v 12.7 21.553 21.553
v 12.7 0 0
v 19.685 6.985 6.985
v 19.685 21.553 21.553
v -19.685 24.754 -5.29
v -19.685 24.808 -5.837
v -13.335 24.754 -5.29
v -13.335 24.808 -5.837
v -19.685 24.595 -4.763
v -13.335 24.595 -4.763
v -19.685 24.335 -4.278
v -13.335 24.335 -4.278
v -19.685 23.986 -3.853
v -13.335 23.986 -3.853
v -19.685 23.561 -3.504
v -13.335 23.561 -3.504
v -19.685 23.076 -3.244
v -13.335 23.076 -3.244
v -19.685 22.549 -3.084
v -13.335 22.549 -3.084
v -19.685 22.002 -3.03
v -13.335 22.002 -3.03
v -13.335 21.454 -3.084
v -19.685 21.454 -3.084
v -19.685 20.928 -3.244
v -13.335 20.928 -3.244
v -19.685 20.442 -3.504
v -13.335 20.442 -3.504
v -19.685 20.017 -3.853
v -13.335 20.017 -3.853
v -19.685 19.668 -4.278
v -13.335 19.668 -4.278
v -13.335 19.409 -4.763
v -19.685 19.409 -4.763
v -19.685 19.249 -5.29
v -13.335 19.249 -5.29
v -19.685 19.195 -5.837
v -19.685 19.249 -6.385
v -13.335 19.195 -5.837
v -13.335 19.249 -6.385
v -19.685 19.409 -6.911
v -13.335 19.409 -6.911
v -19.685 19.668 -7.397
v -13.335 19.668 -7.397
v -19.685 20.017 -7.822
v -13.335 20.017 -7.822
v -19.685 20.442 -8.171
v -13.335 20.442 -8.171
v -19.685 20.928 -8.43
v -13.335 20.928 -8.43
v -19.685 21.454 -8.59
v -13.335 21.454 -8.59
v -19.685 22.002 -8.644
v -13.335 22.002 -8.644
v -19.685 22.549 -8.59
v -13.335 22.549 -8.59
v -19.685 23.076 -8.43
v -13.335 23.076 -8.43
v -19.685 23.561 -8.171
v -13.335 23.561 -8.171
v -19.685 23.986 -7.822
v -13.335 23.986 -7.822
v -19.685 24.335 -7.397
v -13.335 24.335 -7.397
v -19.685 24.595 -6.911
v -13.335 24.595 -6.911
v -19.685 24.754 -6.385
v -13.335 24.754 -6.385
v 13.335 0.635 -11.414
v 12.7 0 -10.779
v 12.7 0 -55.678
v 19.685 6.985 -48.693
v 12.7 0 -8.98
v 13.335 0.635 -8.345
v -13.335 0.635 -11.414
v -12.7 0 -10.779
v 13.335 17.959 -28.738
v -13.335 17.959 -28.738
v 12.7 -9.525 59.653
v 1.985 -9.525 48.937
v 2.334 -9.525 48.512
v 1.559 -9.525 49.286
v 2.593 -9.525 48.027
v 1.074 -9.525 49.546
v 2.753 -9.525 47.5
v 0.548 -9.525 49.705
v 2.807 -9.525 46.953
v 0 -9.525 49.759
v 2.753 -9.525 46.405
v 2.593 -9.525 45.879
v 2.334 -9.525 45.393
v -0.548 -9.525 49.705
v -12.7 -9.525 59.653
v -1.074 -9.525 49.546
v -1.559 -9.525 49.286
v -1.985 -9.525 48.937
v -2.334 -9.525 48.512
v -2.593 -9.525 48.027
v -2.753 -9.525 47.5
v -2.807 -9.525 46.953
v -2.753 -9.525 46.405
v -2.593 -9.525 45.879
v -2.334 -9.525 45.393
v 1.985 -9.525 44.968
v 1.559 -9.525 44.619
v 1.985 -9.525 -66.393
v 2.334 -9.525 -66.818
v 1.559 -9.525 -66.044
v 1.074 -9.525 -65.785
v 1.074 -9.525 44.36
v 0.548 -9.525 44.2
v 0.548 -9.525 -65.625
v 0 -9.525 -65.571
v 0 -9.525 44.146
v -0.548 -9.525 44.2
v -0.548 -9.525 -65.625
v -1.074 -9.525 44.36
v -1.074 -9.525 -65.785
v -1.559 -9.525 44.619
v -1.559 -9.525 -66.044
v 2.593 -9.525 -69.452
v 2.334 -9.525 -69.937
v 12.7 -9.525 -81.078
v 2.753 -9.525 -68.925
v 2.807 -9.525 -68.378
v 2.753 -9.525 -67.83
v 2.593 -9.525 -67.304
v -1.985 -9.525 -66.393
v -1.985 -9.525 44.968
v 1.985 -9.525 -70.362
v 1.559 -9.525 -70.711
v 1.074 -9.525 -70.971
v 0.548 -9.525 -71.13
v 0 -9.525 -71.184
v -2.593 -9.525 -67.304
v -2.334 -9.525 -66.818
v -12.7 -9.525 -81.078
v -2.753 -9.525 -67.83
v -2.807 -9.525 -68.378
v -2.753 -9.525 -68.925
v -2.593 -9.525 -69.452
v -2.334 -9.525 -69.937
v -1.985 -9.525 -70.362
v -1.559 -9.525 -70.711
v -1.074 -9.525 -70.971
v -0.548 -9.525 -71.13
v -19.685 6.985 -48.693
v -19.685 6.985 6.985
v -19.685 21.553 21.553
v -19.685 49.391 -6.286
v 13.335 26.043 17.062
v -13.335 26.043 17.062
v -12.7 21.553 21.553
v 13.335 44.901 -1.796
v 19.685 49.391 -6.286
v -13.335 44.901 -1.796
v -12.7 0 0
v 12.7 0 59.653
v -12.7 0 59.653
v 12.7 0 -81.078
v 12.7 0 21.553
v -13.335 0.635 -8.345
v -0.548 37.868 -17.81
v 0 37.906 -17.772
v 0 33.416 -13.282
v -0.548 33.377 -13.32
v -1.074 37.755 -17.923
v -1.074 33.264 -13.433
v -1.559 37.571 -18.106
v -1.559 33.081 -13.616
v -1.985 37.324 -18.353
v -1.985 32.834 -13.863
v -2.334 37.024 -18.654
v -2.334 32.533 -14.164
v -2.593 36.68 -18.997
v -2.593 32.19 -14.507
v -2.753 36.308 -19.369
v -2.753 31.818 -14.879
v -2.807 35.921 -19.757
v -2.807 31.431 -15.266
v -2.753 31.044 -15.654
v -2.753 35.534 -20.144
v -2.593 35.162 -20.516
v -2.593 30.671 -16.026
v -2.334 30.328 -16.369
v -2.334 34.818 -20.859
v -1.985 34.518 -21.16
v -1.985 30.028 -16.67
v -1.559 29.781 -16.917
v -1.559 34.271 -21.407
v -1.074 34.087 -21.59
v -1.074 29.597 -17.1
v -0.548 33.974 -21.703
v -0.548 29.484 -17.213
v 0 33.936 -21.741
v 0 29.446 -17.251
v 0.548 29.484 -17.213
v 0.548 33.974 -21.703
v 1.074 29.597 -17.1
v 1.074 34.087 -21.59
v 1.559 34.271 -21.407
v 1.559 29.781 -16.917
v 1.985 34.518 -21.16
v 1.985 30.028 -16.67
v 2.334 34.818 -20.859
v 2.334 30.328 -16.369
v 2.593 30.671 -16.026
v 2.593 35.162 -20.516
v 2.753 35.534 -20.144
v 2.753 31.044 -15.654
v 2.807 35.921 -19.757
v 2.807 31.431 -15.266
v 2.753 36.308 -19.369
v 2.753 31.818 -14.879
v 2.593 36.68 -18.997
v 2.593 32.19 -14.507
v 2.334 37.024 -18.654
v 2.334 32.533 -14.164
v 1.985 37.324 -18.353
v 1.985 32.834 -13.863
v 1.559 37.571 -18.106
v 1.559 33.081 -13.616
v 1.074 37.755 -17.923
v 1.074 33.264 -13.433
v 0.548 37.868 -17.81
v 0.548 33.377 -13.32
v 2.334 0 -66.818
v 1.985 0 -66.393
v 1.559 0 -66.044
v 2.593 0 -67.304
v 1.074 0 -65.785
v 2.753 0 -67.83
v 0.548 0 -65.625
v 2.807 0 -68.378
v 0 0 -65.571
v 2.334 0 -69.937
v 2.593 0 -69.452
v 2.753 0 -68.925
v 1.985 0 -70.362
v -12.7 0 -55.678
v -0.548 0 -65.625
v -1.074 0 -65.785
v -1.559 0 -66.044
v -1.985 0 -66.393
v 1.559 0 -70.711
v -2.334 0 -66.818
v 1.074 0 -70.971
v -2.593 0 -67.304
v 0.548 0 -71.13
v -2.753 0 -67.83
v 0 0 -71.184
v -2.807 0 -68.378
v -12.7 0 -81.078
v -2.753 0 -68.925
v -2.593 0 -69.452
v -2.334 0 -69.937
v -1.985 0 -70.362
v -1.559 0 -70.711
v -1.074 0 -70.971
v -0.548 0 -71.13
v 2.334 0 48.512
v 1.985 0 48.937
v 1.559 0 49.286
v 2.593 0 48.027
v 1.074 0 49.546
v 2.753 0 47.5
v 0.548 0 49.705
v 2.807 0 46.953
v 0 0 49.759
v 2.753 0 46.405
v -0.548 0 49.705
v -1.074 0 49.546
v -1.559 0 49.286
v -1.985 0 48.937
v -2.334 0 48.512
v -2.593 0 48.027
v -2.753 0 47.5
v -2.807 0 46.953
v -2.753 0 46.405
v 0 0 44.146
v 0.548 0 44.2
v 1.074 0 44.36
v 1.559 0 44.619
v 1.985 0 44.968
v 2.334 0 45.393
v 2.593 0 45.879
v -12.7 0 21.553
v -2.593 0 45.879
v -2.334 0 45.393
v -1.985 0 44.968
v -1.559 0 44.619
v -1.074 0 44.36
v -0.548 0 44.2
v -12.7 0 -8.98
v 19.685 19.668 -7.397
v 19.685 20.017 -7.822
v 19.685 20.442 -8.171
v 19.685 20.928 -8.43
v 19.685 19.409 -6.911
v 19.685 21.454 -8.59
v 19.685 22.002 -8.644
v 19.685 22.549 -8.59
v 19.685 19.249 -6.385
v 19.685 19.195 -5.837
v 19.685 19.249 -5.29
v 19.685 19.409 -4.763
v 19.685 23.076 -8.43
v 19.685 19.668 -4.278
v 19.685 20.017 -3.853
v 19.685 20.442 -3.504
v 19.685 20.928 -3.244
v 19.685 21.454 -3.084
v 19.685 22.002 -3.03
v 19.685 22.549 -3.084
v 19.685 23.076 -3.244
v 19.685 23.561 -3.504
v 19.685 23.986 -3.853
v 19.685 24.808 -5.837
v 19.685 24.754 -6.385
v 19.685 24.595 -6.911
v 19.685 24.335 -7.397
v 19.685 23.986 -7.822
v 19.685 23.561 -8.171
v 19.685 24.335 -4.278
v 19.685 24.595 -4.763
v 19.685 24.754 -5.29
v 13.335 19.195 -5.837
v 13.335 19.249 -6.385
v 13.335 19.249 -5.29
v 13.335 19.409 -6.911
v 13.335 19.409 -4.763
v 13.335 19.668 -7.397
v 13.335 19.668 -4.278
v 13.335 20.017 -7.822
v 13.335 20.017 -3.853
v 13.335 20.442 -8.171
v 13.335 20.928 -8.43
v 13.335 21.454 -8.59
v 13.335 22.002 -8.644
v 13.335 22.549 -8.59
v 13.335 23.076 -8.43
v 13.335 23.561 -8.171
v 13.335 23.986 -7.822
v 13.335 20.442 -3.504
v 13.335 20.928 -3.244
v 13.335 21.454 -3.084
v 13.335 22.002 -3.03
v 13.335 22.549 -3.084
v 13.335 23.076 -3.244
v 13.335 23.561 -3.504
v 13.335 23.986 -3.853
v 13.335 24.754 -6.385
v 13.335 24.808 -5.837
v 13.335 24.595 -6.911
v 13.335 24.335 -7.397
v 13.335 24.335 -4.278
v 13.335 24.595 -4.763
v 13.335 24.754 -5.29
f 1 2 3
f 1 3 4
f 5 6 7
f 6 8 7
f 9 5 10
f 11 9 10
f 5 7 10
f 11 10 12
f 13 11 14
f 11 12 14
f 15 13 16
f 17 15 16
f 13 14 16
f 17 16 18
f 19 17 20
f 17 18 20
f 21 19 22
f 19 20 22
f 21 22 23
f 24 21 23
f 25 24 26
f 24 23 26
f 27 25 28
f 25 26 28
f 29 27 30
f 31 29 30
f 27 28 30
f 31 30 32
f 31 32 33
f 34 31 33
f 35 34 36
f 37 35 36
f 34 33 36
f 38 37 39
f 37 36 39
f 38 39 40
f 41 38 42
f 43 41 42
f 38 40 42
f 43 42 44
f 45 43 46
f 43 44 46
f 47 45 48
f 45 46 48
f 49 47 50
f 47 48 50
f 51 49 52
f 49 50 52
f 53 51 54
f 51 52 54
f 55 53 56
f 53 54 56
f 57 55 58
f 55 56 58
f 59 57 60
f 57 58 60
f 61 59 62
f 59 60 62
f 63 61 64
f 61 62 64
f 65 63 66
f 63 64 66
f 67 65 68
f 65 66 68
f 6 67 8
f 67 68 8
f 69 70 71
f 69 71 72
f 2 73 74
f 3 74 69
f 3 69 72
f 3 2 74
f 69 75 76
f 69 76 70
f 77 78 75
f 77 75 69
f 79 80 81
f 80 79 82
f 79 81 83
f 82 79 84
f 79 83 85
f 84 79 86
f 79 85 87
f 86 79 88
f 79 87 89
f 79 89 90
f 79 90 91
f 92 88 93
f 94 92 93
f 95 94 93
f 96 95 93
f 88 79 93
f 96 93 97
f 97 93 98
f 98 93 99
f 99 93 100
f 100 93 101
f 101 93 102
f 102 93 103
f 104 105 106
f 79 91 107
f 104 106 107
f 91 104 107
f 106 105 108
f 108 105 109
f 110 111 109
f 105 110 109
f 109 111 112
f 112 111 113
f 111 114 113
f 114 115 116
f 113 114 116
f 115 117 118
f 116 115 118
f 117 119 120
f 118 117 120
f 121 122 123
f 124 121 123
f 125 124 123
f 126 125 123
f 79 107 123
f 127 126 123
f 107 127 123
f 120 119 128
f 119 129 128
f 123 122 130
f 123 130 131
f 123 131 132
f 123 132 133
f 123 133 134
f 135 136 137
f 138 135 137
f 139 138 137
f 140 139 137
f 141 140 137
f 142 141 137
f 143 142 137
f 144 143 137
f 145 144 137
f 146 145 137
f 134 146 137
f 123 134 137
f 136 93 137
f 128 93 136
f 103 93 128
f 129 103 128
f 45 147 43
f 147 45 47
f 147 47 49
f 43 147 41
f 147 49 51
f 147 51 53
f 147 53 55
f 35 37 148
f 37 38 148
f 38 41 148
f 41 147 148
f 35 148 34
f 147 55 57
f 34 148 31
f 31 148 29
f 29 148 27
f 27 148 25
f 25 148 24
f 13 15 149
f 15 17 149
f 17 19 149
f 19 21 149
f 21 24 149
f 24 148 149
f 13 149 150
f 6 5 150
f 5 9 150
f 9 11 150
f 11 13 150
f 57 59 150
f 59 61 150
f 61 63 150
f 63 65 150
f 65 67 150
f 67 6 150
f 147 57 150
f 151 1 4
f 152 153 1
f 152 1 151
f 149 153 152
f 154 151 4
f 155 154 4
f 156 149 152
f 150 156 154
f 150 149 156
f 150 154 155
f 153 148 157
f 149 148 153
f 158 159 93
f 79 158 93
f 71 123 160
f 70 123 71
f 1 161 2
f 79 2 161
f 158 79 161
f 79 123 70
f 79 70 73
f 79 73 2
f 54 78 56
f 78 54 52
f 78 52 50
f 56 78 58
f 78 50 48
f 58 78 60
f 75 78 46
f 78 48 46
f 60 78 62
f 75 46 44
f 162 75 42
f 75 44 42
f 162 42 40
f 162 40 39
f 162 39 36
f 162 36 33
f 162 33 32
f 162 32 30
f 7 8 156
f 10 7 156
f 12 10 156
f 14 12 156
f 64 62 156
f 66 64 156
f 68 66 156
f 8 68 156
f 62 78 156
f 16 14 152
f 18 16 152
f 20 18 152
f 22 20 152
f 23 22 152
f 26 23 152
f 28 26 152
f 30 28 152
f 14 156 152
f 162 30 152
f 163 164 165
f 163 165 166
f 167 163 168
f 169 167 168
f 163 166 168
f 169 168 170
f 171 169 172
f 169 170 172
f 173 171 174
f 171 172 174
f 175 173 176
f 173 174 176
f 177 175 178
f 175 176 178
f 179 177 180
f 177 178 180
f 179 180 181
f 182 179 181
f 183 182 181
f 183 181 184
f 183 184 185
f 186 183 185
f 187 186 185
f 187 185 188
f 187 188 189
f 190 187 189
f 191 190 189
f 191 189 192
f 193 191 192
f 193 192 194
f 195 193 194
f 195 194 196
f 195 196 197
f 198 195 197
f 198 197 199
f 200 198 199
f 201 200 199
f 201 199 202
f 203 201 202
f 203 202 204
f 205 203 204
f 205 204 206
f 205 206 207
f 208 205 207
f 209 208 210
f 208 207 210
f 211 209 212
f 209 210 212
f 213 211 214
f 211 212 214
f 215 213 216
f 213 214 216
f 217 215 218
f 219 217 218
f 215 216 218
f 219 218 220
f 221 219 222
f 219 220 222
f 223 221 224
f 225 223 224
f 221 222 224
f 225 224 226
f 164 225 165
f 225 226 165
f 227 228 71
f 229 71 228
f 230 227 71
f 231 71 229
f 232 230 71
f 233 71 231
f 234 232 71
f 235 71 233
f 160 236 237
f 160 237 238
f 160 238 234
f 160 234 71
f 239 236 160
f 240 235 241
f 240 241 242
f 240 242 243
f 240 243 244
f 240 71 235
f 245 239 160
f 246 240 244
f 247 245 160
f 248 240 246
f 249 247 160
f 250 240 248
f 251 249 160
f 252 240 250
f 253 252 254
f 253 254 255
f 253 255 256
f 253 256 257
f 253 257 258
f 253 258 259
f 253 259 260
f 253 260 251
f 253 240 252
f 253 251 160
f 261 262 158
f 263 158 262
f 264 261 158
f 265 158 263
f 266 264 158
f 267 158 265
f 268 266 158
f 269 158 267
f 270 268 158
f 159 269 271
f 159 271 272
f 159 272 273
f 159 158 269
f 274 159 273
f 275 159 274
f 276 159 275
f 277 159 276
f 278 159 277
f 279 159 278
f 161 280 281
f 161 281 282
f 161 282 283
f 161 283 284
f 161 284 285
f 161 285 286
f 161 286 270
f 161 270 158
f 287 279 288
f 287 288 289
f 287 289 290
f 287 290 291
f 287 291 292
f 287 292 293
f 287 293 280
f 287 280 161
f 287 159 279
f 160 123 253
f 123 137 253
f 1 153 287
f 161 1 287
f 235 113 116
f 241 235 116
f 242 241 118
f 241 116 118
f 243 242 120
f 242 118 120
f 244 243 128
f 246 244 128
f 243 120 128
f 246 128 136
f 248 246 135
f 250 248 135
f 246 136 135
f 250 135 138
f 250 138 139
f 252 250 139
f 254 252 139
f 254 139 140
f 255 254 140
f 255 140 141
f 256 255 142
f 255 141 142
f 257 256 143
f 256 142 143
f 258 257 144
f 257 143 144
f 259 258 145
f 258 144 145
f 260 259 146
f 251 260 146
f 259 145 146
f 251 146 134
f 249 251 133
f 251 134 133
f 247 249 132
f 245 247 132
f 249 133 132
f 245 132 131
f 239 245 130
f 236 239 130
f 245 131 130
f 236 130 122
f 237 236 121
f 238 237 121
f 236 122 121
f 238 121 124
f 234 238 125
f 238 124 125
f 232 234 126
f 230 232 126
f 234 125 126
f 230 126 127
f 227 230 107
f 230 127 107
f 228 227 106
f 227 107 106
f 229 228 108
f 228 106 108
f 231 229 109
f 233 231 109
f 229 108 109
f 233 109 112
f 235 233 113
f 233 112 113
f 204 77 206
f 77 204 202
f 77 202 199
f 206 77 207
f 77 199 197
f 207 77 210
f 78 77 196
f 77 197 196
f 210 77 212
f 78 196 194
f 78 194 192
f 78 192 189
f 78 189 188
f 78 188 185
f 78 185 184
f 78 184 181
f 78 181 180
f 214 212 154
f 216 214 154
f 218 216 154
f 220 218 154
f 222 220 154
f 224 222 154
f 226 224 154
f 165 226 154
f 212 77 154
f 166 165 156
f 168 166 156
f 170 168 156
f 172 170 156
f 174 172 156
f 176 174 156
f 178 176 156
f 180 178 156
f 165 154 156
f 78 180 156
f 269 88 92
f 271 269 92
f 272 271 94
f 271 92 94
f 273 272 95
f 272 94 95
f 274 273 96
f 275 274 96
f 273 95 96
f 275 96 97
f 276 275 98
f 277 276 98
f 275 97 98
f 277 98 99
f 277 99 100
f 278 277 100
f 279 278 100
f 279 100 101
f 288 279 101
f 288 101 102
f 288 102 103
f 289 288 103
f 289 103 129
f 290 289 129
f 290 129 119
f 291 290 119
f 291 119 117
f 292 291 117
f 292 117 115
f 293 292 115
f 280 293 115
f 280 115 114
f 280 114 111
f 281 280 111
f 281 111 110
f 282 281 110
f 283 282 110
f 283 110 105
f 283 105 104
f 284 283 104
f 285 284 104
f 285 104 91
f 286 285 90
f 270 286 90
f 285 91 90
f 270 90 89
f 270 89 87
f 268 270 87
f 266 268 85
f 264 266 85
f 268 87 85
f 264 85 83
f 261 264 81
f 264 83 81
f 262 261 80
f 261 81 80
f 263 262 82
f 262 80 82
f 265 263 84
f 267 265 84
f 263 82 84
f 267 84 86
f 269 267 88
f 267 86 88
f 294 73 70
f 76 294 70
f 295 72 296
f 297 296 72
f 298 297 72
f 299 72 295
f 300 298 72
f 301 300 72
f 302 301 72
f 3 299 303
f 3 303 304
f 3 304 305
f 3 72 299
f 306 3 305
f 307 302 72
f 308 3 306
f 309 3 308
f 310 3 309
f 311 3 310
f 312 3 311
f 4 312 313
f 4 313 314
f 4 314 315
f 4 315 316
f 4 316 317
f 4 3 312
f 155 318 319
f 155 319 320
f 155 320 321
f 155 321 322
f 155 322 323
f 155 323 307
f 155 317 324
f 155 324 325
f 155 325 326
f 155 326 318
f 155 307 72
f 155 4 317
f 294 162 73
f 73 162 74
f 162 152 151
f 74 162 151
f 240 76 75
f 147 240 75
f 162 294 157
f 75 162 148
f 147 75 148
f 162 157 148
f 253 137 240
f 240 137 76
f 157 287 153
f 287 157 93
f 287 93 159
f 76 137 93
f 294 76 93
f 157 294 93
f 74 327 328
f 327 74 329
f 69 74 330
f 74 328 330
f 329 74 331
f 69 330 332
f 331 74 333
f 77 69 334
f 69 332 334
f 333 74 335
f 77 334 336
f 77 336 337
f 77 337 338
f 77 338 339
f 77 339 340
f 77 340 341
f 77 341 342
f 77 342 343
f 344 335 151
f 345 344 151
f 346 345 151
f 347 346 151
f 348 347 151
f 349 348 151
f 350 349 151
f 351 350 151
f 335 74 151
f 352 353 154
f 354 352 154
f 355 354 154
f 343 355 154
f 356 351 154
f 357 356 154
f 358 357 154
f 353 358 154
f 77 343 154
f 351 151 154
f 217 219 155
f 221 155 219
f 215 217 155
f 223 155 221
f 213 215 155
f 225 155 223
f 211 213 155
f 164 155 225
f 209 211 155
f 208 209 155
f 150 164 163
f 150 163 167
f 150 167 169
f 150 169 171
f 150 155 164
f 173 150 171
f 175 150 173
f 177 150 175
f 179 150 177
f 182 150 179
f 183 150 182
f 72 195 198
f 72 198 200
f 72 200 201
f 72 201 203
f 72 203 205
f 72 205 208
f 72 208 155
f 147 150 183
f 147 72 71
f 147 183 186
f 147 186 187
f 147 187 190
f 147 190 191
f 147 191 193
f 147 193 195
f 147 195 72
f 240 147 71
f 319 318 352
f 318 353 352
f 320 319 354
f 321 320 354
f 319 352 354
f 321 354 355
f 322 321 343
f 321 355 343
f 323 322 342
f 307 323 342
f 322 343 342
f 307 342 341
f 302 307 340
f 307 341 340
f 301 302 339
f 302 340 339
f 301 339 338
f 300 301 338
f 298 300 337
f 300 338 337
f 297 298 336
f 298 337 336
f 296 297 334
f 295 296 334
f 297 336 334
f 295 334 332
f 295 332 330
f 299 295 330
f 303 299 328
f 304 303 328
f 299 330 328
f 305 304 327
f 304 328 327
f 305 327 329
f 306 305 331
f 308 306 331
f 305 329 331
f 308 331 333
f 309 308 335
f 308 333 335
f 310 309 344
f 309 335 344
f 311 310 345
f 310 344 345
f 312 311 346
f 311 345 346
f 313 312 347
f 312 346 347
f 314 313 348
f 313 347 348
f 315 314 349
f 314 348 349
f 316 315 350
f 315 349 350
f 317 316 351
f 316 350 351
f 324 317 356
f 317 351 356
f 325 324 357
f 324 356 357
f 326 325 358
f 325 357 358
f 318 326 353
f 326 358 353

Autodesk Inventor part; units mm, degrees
ref_plane "YZ Plane" through (0, 0, 0) normal (1, 0, 0) x (0, 1, 0)
ref_plane "XZ Plane" through (0, 0, 0) normal (0, 1, 0) x (-1, 0, 0)
ref_plane "XY Plane" through (0, 0, 0) normal (0, 0, 1) x (1, 0, 0)
sketch "Sketch1" plane through (0, 0, 0) normal (1, 0, 0) x (0, 1, 0)
  line L0 (0, 0) -> (21.5526, 21.5526)
  line L1 (21.5526, 21.5526) -> (49.3914, -6.2862)
  line L2 (0, -98.8011) -> (0, 41.6267) projected
  line L3 (49.3914, -6.2862) -> (0, -55.6776)
  line L4 (0, 0) -> (0, -55.6776)
  line L5 (26.9408, 16.1645) -> (0, -10.7763) construction
  dimension "d0" = 39.37
  dimension "d1" = 45
  dimension "d5" = 7.62
  dimension "d6" = 38.1
extrude "Extrusion1" add sketch "Sketch1" along normal mid plane 39.37
sketch "Sketch2" plane through (-19.685, 21.5526, 21.5526) normal (0, 0.7071, 0.7071) x (1, 0, 0)
  line L0 (0, 0) -> (39.37, 0) construction
  line L1 (39.37, 0) -> (39.37, 39.37) construction
  line L2 (0, 0) -> (39.37, 39.37) construction
  line L3 (39.37, 39.37) -> (0, 39.37) construction
  line L4 (0, 39.37) -> (39.37, 0) construction
  line L5 (6.35, 6.35) -> (33.02, 6.35)
  line L6 (33.02, 6.35) -> (33.02, 33.02)
  line L7 (33.02, 33.02) -> (6.35, 33.02)
  line L8 (6.35, 33.02) -> (6.35, 6.35)
  line L9 (6.35, 6.35) -> (33.02, 33.02) construction
  line L10 (33.02, 6.35) -> (6.35, 33.02) construction
  point P0 (19.685, 0)
  point P1 (19.685, 19.685)
  dimension "d7" = 26.67
extrude "Extrusion2" cut sketch "Sketch2" against normal blind 38.1
sketch "Sketch3" plane through (0, 0, 0) normal (1, 0, 0) x (0, 1, 0)
  line L0 (21.5526, 21.5526) -> (0, 0) projected
  line L1 (0, 0) -> (0, -55.6776) projected
  line L2 (0, -55.6776) -> (49.3914, -6.2862) projected
  line L3 (17.9605, -28.7368) -> (0, -10.7763) projected
  line L4 (26.0427, 17.0625) -> (0, -8.9803) projected
  line L5 (0, 0) -> (0, -55.6776)
  line L6 (21.5526, 21.5526) -> (8.0019, 21.5526) construction
  line L7 (0, 0) -> (21.5526, 21.5526) projected
  line L8 (0, 0) -> (0, 59.6526)
  line L9 (49.3914, -6.2862) -> (0, -55.6776) projected
  line L10 (0, -55.6776) -> (0, -81.0776)
  line L11 (0, -136.9011) -> (0, 92.4267) projected
  line L12 (0, 59.6526) -> (-9.525, 59.6526)
  line L13 (-9.525, 59.6526) -> (-9.525, -81.0776)
  line L14 (-9.525, -81.0776) -> (0, -81.0776)
  point P0 (1.0999, -13.335)
  point P1 (0, -15.24)
  point P2 (0, -10.7763)
  dimension "d10" = 38.1
  dimension "d11" = 25.4
  dimension "d12" = 9.525
  dimension "supportBaseLength" = 140.7302
extrude "Extrusion3" add sketch "Sketch3" along normal mid plane 25.4
sketch "Sketch5" plane through (0, 0, 0) normal (1, 0, 0) x (0, 1, 0)
  line L0 (0, 0) -> (21.5526, 21.5526) projected
  line L1 (0, 59.6526) -> (0, 0) projected
  line L2 (21.5526, 21.5526) -> (49.3914, -6.2862) projected
  line L3 (21.5526, 21.5526) -> (0, 21.5526)
  line L4 (0, 0) -> (21.5526, 21.5526)
extrude "Extrusion5" add sketch "Sketch5" along normal mid plane 25.4
sketch "Sketch4" plane through (0, 0, 0) normal (0, 0, 1) x (1, 0, 0)
  line L0 (19.685, 49.3914) -> (-19.685, 49.3914) projected
  line L1 (19.685, 0) -> (19.685, 49.3914) projected
  line L2 (19.685, 0) -> (12.7, 0) projected
  line L3 (12.7, 0) -> (-12.7, 0) projected
  line L4 (-12.7, 0) -> (-19.685, 0) projected
  line L5 (-19.685, 49.3914) -> (-19.685, 0) projected
  line L6 (-12.7, 0) -> (-12.7, -9.525) projected
  line L7 (12.7, -9.525) -> (-12.7, -9.525) projected
  line L8 (12.7, -9.525) -> (12.7, 0) projected
  line L9 (-12.7, 0) -> (-19.685, 6.985)
  line L10 (-19.685, 49.3914) -> (-19.685, 0) projected
  line L11 (-19.685, 6.985) -> (-19.685, 0)
  line L12 (0, 0) -> (0, 49.3914) construction
  line L13 (12.7, 0) -> (19.685, 0)
  line L14 (12.7, 0) -> (19.685, 6.985)
  line L15 (19.685, 6.985) -> (19.685, 0)
  dimension "d15" = 45
extrude "Extrusion4" cut sketch "Sketch4" against normal up to surface (140.7302 mm away) from surface at 59.6526 contours L1 L2 L14 | L9 L4 L5
sketch "Sketch6" plane through (-12.7, 0, 59.6526) normal (0, 1, 0) x (1, 0, 0)
  line L0 (25.4, 140.7302) -> (0, 140.7302) construction
  line L1 (12.7, 140.7302) -> (12.7, 0) construction
  line L2 (25.4, 0) -> (0, 0) construction
  point P0 (12.7, 59.6526)
  point P1 (12.7, 128.0302)
  point P2 (12.7, 12.7)
  dimension "d21" = 12.7
  dimension "d22" = 12.7
hole "Hole1" at (0, 0, -68.3776) at (0, 0, 46.9526) direction (0, -1, 0) diameter 5.6134 end through all clearance for "Flat Head Machine Screw (82)" size "#10" standard "Ansi Unified Screw Threads"
sketch "Sketch9" plane through (0, 0, 0) normal (1, 0, 0) x (0, 1, 0)
  line L0 (0.635, -8.3453) -> (0.635, -11.4113) projected
  line L1 (0.635, -11.4113) -> (17.9605, -28.7368) projected
  line L2 (44.9013, -1.7961) -> (17.9605, -28.7368) projected
  line L3 (26.0427, 17.0625) -> (44.9013, -1.7961) projected
  line L4 (26.0427, 17.0625) -> (0.635, -8.3453) projected
  line L5 (35.472, 7.6332) -> (8.5312, -19.3076) construction
  line L6 (0.635, -11.4113) -> (17.9605, -28.7368) construction
  circle A0 centre (22.0016, -5.8372) radius 2.8067
  point P0 (0, 0)
  dimension "d30" = 5.6134
extrude "Extrusion6" cut sketch "Sketch9" along normal through all both and the other way through all contours A0
sketch "Sketch10" plane through (-19.685, 49.3914, -6.2862) normal (0, 0.7071, -0.7071) x (1, 0, 0)
  line L0 (6.35, 0) -> (33.02, 0) construction
  line L1 (19.685, 0) -> (19.685, 77.7875) construction
  point P0 (19.685, 30.48)
  point P1 (19.685, 19.05)
  dimension "d33" = 19.05
hole "Hole2" at (0, 35.921, -19.7566) direction (0, -0.7071, 0.7071) diameter 5.6134 depth 6.35 clearance for "Flat Head Machine Screw (82)" size "#10" standard "Ansi Unified Screw Threads"
equation "\"d0\" = widthToSupportExtrusion"
equation "\"d1\" = attachementAngle"
equation "\"d6\" = insertDepth"
equation "\"d2\" = widthToSupportExtrusion"
equation "\"d7\" = insertForExtrusion"
equation "\"d8\" = insertDepth"
equation "\"d10\" = lenghtUnderBrace"
equation "\"d11\" = backLength"
equation "\"d12\" = supportBaseDepth"
equation "\"d13\" = supportBaseWidth"
equation "\"d19\" = supportBaseWidth"
equation "\"d21\" = supportHoleDistanceFromEnd"
equation "\"d22\" = supportHoleDistanceFromEnd"
equation "\"attachementAngle\" = 45deg"
equation "\"extrusionSize\" = 25.4"
equation "\"wallThickness\" = 6.35"
equation "\"slipClearance\" = 0.635"
equation "\"insertForExtrusion\" = extrusionSize + 2 * slipClearance"
equation "\"widthToSupportExtrusion\" = insertForExtrusion + 2 * wallThickness"
equation "\"insertDepth\" = 38.1"
equation "\"supportBaseWidth\" = 25.4"
equation "\"supportBaseDepth\" = 9.525"
equation "\"supportHoleDistanceFromEnd\" = 12.7"
equation "\"lenghtUnderBrace\" = 38.1"
equation "\"backLength\" = 25.4"
properties part number "45DegreeAttachementV03"
